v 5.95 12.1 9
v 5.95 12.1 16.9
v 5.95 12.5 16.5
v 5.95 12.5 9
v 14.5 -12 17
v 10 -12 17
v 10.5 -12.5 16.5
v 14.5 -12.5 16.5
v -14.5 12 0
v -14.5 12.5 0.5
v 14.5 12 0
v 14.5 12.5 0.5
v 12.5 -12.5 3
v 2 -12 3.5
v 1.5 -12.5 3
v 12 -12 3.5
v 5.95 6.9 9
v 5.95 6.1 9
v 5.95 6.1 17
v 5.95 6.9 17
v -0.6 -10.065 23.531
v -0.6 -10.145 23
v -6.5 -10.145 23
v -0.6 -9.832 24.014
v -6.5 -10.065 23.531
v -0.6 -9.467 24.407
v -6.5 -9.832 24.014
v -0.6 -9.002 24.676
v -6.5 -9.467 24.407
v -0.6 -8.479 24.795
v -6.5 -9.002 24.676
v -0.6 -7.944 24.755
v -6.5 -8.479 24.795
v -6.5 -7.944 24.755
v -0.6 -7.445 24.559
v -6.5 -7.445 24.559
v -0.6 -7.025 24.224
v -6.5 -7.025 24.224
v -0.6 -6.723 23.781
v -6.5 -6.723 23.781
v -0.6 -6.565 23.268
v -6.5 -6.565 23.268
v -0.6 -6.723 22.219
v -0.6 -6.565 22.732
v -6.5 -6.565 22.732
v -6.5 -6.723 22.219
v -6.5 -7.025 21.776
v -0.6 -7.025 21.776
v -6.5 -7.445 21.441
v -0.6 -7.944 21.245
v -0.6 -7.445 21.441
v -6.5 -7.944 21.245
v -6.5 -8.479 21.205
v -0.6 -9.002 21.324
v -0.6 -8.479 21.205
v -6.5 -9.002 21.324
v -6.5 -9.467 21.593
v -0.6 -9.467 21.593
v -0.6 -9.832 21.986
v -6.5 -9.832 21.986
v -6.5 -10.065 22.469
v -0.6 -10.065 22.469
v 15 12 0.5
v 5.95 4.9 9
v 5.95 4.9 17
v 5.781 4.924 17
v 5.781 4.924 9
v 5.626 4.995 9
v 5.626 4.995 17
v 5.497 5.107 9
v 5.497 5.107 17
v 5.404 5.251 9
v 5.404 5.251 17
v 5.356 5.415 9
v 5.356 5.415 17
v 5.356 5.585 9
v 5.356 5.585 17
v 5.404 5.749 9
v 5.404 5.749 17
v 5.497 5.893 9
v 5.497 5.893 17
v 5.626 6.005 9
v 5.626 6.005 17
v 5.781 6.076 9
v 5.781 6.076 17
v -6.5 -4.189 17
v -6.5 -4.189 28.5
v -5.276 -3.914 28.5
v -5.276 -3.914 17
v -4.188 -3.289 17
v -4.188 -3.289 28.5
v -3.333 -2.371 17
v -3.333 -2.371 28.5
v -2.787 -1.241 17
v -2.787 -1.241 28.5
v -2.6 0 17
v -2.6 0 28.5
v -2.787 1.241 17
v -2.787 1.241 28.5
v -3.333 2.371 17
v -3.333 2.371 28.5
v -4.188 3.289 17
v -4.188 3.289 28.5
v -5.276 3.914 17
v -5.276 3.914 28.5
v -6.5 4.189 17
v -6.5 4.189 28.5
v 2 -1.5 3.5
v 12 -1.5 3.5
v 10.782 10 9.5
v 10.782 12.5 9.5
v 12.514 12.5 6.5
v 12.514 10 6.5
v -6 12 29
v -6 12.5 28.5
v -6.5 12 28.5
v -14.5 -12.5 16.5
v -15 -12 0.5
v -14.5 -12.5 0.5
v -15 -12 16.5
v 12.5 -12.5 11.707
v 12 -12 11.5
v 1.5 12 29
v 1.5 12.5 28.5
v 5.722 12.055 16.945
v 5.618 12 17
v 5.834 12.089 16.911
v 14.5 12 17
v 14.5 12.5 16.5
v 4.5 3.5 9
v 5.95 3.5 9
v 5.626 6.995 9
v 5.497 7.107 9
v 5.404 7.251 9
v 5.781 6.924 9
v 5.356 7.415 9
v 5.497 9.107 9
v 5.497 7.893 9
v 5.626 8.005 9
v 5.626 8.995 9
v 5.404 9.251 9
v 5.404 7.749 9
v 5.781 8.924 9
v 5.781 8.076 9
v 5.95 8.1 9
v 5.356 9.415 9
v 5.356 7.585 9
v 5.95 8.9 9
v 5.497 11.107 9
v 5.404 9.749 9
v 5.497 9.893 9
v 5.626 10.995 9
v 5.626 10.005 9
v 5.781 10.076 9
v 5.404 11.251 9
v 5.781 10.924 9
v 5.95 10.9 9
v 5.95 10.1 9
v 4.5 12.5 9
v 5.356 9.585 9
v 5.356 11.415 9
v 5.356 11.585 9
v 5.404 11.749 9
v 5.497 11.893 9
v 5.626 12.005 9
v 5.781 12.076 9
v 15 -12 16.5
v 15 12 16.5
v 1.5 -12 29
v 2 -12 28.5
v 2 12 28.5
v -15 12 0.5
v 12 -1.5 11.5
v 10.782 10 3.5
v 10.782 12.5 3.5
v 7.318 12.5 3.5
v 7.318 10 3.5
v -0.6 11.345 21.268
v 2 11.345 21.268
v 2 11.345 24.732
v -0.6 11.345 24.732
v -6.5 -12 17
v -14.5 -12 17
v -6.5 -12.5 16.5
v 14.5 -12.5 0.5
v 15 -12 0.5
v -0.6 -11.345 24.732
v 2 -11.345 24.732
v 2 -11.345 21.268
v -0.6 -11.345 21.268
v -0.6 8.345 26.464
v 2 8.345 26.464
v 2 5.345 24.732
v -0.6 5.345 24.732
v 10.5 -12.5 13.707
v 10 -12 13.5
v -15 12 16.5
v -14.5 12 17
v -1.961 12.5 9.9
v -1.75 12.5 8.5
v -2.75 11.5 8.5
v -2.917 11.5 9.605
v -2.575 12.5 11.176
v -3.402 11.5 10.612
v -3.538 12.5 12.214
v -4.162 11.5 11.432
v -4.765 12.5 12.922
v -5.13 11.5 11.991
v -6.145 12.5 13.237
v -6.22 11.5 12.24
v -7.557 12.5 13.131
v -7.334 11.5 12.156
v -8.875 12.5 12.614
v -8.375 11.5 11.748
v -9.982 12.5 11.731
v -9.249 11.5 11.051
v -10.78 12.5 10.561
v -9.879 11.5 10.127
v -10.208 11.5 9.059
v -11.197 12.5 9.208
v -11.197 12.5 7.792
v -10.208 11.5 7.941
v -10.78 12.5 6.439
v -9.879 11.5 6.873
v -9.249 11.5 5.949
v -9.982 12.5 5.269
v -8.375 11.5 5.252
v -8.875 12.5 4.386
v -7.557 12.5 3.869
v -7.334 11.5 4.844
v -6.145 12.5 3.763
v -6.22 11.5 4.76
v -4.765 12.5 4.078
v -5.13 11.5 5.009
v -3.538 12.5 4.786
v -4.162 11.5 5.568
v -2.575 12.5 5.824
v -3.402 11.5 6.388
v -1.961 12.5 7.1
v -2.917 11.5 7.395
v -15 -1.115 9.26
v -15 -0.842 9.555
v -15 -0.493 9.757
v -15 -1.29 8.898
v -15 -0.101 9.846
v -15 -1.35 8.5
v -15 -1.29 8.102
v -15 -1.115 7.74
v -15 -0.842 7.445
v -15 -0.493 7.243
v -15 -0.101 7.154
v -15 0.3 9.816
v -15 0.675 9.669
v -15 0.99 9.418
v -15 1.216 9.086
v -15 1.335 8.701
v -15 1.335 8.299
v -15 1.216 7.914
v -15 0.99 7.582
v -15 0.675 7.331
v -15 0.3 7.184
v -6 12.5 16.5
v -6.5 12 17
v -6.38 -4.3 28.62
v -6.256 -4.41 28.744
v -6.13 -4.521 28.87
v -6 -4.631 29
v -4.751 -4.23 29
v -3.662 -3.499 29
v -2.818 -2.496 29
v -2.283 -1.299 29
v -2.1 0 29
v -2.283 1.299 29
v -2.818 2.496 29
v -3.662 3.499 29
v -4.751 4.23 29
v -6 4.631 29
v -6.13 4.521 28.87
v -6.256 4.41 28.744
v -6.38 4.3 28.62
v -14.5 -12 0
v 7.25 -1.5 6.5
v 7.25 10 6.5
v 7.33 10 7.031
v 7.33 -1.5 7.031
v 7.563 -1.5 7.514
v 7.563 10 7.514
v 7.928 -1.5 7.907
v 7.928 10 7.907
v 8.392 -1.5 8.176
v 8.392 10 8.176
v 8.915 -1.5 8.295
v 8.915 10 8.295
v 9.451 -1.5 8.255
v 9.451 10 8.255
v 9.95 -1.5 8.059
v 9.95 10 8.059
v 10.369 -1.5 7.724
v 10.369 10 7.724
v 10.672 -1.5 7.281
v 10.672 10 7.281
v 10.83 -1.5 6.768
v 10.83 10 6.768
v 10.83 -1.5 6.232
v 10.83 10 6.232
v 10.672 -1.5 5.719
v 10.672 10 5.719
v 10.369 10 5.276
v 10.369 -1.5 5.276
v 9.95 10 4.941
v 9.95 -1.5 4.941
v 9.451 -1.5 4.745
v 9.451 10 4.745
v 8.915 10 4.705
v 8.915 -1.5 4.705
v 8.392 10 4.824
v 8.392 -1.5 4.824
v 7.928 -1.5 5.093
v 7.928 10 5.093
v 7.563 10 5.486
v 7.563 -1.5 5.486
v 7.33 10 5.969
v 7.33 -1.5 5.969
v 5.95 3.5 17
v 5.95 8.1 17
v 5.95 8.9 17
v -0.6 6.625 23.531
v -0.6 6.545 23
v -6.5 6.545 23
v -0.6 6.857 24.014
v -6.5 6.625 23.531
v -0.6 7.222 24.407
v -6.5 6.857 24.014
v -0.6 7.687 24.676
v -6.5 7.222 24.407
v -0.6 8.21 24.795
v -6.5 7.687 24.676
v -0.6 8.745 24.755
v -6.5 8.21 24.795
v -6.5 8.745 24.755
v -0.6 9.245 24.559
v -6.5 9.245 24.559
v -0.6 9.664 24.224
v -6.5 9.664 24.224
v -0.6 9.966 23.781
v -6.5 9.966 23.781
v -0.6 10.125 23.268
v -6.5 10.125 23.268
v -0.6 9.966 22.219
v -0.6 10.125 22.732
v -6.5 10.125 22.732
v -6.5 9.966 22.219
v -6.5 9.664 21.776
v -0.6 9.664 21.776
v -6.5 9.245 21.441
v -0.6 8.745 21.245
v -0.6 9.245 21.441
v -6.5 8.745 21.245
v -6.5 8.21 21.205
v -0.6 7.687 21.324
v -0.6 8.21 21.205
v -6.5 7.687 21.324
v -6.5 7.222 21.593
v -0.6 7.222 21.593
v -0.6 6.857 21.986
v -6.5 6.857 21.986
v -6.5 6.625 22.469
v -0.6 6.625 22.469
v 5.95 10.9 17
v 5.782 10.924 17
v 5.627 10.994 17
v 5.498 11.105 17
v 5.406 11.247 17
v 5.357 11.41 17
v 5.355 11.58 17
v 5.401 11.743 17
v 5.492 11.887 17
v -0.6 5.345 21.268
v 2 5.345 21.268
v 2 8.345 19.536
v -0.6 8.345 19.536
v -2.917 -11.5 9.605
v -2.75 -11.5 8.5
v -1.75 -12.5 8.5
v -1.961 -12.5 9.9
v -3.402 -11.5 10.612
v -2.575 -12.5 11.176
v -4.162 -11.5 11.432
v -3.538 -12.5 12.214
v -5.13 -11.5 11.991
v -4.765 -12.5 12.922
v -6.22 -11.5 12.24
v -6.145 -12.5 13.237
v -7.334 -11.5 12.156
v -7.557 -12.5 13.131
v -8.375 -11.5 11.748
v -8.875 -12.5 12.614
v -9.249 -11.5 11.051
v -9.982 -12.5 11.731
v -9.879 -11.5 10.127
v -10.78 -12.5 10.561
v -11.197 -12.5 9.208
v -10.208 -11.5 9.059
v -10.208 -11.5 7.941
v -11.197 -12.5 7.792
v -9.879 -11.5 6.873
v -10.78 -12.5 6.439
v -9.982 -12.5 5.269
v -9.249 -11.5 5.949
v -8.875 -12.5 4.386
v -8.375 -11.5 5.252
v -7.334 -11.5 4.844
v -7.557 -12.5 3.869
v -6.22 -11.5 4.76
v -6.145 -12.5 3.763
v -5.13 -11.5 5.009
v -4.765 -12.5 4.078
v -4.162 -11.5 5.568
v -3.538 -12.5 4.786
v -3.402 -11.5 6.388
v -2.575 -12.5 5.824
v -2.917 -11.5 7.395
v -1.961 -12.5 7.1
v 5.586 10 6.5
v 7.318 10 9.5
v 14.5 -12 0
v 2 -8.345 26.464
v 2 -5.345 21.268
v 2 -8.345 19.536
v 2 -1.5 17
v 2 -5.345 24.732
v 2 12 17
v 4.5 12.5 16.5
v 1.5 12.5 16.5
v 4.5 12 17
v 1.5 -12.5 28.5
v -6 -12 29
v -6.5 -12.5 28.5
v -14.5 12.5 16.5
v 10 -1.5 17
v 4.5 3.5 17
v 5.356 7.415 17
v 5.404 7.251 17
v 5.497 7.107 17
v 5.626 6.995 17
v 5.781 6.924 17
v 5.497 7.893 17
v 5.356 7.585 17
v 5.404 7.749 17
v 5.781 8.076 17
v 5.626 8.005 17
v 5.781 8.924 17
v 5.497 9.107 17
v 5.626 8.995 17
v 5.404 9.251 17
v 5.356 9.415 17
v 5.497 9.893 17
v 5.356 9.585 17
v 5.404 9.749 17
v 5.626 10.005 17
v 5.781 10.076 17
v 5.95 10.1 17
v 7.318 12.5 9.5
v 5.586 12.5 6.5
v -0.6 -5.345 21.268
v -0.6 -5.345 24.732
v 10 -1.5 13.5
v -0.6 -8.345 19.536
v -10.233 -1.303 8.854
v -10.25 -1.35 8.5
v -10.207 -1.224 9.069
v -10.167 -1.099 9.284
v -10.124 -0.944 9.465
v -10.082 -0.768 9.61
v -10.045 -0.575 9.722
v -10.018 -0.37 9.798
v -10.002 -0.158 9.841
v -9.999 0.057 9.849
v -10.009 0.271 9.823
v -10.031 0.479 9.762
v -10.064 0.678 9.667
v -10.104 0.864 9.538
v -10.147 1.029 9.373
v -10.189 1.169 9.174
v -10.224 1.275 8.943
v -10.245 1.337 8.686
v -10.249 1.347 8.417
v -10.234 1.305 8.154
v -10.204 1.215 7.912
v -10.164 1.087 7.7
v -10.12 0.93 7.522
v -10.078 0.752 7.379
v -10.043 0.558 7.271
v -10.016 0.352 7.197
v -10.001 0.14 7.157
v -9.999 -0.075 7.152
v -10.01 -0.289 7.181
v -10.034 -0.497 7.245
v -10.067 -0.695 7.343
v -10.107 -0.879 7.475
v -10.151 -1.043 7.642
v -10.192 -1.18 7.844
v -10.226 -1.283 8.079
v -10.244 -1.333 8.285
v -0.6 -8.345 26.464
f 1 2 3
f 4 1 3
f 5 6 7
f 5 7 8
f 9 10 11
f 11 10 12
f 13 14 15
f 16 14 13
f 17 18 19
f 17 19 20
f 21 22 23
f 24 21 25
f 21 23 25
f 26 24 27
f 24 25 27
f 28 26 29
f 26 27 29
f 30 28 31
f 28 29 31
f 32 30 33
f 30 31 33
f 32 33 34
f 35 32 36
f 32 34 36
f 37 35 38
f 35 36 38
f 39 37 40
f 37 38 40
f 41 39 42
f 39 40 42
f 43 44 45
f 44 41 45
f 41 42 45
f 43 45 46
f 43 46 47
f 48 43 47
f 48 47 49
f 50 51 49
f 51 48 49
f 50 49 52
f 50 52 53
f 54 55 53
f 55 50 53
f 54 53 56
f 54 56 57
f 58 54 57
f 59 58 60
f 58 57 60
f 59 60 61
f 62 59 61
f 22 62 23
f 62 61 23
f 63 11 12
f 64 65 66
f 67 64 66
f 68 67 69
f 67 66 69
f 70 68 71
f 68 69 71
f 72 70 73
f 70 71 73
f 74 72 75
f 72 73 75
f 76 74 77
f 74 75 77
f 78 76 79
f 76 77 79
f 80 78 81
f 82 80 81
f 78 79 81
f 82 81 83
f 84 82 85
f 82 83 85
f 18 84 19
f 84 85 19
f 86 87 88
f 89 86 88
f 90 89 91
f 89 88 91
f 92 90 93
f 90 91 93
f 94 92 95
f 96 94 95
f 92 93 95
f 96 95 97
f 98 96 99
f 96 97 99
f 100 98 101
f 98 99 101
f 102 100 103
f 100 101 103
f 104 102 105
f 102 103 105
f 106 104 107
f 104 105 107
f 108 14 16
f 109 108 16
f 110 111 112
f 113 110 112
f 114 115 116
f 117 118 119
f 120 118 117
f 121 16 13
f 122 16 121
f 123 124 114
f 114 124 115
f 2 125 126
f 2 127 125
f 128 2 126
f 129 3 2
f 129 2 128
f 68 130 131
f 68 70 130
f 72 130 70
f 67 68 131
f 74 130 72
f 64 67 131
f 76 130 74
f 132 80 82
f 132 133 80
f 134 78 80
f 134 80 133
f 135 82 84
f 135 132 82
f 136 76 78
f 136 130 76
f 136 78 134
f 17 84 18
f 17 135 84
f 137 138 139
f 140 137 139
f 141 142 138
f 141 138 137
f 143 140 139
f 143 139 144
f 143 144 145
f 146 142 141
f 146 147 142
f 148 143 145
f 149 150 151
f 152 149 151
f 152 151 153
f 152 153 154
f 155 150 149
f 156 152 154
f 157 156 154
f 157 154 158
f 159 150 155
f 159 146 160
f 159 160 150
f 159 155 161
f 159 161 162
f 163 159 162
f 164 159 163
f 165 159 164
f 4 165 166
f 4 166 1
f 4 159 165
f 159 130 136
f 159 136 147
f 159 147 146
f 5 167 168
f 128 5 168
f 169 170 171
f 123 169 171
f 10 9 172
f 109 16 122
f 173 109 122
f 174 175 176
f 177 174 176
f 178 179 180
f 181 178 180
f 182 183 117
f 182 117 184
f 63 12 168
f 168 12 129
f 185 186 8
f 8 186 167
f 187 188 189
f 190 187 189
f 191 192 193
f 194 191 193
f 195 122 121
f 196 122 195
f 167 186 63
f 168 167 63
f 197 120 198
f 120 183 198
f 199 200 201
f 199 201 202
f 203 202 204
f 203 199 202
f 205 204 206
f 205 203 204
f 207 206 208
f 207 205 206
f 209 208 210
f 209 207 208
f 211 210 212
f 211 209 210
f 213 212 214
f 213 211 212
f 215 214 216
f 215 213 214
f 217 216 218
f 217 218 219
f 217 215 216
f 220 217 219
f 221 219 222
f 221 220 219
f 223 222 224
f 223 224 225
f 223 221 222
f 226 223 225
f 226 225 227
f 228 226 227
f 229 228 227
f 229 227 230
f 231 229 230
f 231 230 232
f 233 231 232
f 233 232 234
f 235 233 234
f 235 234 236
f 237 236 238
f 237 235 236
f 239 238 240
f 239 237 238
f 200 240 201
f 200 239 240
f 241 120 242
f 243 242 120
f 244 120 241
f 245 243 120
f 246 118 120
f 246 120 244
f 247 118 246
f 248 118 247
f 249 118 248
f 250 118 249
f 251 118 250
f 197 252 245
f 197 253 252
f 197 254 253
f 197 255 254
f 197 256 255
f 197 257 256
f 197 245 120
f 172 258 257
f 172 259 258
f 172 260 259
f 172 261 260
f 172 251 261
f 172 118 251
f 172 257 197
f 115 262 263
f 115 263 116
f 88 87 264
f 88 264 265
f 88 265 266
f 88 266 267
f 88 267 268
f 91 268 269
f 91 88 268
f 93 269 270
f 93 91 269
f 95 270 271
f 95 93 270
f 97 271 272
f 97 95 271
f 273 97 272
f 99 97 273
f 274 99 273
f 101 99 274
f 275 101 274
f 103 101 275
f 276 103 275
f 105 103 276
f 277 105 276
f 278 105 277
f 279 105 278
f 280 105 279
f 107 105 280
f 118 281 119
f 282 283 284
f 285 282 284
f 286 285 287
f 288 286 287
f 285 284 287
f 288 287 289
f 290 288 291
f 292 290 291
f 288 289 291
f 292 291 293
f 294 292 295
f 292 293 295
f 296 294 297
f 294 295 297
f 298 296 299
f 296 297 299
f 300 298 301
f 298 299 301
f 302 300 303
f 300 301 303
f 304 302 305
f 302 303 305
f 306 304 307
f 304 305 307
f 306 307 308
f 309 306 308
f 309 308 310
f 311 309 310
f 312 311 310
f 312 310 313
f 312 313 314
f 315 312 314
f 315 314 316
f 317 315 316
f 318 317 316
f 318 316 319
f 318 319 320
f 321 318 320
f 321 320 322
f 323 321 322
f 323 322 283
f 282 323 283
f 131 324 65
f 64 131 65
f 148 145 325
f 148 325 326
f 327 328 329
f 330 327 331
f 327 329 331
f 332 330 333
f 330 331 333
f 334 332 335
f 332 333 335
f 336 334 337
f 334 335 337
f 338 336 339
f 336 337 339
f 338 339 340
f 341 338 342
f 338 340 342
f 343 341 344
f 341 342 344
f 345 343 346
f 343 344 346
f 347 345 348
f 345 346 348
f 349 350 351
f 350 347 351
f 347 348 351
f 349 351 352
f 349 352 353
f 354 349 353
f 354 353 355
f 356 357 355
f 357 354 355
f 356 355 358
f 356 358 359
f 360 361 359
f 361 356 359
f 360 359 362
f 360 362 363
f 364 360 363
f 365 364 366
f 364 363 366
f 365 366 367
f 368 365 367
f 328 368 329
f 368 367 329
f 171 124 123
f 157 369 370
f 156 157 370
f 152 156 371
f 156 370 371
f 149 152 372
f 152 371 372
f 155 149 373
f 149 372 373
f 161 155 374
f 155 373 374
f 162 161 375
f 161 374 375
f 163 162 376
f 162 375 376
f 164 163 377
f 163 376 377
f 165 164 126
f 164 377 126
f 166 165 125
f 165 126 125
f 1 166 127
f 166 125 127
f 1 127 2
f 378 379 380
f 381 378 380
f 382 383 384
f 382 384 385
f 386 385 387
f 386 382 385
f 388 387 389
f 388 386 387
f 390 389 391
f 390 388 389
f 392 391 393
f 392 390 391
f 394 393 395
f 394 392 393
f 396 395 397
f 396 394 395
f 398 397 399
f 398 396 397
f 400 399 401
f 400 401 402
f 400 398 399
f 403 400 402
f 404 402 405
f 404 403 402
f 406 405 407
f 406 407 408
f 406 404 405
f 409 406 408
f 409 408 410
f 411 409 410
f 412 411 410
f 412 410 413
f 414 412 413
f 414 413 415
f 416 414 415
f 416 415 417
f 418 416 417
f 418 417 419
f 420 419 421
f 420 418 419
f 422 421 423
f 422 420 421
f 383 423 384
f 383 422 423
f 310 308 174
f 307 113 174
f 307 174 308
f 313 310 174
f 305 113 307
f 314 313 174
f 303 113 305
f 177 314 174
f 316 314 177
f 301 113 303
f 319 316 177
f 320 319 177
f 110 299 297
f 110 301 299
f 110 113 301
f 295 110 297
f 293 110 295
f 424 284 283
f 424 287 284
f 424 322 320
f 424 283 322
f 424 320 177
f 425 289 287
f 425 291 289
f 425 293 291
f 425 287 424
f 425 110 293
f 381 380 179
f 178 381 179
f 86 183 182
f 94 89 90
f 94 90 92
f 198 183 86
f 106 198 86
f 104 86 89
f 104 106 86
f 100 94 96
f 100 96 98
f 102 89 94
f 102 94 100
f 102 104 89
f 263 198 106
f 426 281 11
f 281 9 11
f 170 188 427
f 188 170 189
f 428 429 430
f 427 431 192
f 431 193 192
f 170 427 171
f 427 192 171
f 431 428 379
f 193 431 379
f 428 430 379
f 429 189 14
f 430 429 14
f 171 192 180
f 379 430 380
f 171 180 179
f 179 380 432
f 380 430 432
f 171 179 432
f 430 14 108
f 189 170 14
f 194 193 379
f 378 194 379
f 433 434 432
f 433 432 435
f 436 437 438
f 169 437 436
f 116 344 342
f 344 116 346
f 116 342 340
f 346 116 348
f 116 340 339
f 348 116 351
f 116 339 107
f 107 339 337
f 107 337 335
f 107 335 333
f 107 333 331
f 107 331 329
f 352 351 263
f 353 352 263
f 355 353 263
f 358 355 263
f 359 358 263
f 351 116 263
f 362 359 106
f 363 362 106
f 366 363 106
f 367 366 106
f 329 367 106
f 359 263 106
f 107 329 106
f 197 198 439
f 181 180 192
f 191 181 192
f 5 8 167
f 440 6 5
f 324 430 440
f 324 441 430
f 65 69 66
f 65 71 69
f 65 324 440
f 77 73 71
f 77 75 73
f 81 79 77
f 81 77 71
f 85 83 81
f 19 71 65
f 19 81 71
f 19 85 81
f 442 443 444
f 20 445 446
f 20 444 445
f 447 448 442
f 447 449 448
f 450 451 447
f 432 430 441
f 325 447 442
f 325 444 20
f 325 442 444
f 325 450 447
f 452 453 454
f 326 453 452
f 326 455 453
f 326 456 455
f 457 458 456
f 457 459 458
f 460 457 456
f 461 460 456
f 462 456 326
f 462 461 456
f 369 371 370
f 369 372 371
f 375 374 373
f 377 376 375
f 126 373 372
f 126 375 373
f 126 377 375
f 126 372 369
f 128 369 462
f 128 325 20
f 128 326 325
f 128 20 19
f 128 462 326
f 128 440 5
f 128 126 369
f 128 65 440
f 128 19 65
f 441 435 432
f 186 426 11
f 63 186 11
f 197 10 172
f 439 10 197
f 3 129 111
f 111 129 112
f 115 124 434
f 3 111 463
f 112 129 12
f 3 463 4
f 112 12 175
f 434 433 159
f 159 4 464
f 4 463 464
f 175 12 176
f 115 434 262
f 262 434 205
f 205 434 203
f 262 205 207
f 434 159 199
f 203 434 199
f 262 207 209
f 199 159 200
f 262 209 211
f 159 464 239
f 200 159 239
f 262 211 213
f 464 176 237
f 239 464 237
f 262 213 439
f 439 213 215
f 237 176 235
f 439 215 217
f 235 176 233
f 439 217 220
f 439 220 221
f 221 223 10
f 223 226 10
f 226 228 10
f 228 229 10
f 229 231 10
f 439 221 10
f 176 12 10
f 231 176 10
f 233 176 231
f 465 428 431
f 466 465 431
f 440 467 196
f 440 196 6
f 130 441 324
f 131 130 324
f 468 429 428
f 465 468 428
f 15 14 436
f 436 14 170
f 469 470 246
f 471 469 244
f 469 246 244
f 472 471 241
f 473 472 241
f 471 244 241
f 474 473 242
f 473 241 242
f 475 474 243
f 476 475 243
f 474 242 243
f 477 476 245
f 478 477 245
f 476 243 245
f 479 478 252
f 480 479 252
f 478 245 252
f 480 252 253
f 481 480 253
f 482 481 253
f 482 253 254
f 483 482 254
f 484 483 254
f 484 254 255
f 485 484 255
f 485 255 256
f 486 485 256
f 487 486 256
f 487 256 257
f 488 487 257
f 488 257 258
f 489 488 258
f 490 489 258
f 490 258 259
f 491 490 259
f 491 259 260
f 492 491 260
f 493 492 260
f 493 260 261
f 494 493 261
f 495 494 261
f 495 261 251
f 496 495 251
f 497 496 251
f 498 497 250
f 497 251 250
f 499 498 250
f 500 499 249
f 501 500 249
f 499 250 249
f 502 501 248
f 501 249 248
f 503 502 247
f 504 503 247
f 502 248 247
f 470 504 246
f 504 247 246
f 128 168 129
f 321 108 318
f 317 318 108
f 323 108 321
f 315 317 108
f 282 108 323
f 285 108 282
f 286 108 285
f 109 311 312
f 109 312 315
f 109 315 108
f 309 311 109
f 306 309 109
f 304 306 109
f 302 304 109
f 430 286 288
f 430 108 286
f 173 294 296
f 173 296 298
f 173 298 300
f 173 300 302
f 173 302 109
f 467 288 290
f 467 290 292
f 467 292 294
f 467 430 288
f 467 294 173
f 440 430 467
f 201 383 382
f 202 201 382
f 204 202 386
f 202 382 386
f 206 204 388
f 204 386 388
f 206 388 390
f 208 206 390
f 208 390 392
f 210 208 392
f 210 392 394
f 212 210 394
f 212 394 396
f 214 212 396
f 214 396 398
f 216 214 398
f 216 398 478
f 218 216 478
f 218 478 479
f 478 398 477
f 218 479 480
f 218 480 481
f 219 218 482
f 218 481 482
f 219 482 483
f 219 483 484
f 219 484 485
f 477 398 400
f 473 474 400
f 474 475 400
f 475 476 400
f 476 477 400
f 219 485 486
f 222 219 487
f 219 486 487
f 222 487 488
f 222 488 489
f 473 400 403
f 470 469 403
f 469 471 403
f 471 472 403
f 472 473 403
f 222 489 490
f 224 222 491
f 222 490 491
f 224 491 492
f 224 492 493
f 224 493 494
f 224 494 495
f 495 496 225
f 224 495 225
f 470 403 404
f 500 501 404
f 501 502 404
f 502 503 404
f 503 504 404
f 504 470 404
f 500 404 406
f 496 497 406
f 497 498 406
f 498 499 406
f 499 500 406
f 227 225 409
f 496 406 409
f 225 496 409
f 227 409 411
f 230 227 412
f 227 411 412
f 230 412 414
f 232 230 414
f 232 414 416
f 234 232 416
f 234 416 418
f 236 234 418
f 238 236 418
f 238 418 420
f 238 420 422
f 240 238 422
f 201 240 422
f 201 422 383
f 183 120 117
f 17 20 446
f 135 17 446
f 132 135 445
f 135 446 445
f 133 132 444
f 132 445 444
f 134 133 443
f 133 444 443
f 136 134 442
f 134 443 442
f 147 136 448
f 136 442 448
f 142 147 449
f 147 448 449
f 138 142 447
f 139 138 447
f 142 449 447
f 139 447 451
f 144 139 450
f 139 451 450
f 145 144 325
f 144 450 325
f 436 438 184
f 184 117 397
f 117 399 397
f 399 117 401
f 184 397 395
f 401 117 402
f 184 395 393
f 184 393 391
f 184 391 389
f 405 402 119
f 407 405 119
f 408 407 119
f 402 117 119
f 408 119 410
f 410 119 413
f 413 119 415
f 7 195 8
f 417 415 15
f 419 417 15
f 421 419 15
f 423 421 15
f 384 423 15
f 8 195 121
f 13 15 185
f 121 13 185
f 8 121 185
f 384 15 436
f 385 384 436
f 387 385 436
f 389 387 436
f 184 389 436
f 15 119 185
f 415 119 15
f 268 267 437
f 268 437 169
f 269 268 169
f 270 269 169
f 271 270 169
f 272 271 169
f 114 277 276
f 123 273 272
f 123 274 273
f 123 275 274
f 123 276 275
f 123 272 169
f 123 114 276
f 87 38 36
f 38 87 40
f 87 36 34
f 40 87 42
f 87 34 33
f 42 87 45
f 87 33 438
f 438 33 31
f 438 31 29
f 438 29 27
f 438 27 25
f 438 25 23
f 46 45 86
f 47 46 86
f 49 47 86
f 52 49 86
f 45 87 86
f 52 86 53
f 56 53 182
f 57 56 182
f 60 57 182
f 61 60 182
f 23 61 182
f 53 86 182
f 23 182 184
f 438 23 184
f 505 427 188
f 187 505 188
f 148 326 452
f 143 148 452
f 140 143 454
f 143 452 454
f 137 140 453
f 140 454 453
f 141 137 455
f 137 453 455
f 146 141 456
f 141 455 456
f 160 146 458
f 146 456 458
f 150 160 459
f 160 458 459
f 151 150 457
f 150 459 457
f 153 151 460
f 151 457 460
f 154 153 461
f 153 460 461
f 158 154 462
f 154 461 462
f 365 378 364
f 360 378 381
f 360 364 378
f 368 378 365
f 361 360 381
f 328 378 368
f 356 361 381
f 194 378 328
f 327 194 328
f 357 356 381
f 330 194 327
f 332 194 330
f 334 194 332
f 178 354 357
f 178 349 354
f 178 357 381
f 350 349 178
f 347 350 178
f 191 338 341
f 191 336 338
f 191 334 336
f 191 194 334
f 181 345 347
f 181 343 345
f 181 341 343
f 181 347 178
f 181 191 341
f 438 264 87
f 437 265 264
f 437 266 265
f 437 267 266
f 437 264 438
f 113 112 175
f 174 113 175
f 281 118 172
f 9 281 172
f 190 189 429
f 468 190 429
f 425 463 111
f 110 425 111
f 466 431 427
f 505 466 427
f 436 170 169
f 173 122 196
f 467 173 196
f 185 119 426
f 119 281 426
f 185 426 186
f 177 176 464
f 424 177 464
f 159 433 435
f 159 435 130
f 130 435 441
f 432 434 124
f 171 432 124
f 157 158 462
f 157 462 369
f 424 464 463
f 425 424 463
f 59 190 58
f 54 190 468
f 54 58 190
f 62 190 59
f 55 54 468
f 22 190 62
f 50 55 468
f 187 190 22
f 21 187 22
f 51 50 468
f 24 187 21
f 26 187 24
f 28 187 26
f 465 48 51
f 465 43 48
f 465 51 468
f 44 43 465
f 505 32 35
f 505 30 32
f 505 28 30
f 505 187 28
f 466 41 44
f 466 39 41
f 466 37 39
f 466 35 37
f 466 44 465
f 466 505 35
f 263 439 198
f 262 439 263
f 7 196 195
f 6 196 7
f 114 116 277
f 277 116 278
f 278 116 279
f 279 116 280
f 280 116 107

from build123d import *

# Parameters (mm, degrees)
F0_W      = 30
F0_H      = 25
F1_DEPTH  = 17
F3_DEPTH  = 11
F4_R      = 3.75
F5_DEPTH  = 25
F7_DEPTH  = 12
F9_DEPTH  = 12
F10_R     = 1.8
F11_DEPTH = 8.5
F12_R     = 1.8
F13_DEPTH = 2.6
F15_DEPTH = 8
F16_R     = 1.8
F17_DEPTH = 14
F18_R     = 1.8
F19_DEPTH = 2.5
F21_SIZE  = 0.5
F22_SIZE2 = 1
F22_SIZE  = 1
F23_R     = 1.35
F24_DEPTH = 5.0024289631


with BuildPart() as f1:
    # F0 (on Top) → F1 (new body)
    with BuildSketch(Plane.XY):
        Rectangle(F0_W, F0_H)
    extrude(amount=F1_DEPTH)

    # F2 (on face) → F3 (cut)
    with BuildSketch(Plane.XZ.offset(12.5)):
        Polygon((10, 17), (2, 17), (2, 3.5), (12, 3.5), (12, 11.5), (10, 13.5), align=None)
    extrude(amount=-F3_DEPTH, mode=Mode.SUBTRACT)

    # F4 (on face) → F5 (cut, through all)
    with BuildSketch(Plane.XZ.offset(12.5)):
        with Locations((-6.5, 8.5)):
            Circle(F4_R)
    extrude(amount=-F5_DEPTH, mode=Mode.SUBTRACT)

    # F6 (on face) → F7 (join)
    with BuildSketch(Plane.XY.offset(17)):
        Polygon((-6.5, -12.5), (2, -12.5), (2, -1.5), (2, 12.5), (-6.5, 12.5), align=None)
    extrude(amount=F7_DEPTH)

    # F8 (on face) → F9 (cut)
    with BuildSketch(Plane.XY.offset(29)):
        with BuildLine():
            Line((-6.5, 4.1892720131), (-6.5, -4.1892720131))
            ThreePointArc((-6.5, -4.1892720131), (-2.6, 0), (-6.5, 4.1892720131))
        make_face()
    extrude(amount=-F9_DEPTH, mode=Mode.SUBTRACT)

    # F10 (on face) → F11 (cut, through all)
    with BuildSketch(Plane(origin=(-6.5, 0, 0), x_dir=(0, -1, 0), z_dir=(-1, 0, 0))):
        with Locations((-8.3446360066, 23)):
            Circle(F10_R)
        with Locations((8.3446360066, 23)):
            Circle(F10_R)
    extrude(amount=-F11_DEPTH, mode=Mode.SUBTRACT)

    # F12 (on face) → F13 (cut)
    with BuildSketch(Plane.YZ.offset(2)):
        Polygon((11.3446360067, 21.2679491924), (11.3446360067, 24.7320508076), (8.3446360067, 26.4641016151), (5.3446360067, 24.7320508076), (5.3446360067, 21.2679491924), (8.3446360067, 19.5358983849), align=None)
        with Locations((8.3446360066, 23)):
            Circle(F12_R, mode=Mode.SUBTRACT)
        Polygon((-5.3446360065, 21.2679491924), (-5.3446360065, 24.7320508076), (-8.3446360065, 26.4641016151), (-11.3446360065, 24.7320508076), (-11.3446360065, 21.2679491924), (-8.3446360065, 19.5358983849), align=None)
        with Locations((-8.3446360066, 23)):
            Circle(F12_R, mode=Mode.SUBTRACT)
    extrude(amount=-F13_DEPTH, mode=Mode.SUBTRACT)

    # F14 (on face) → F15 (cut)
    with BuildSketch(Plane.XY.offset(17)):
        with BuildLine():
            Line((5.95, 12.5), (4.5, 12.5))
            Line((4.5, 12.5), (4.5, 3.5))
            Line((4.5, 3.5), (5.95, 3.5))
            Line((5.95, 3.5), (5.95, 4.9))
            ThreePointArc((5.95, 4.9), (5.35, 5.5), (5.95, 6.1))
            Line((5.95, 6.1), (5.95, 6.9))
            ThreePointArc((5.95, 6.9), (5.35, 7.5), (5.95, 8.1))
            Line((5.95, 8.1), (5.95, 8.9))
            ThreePointArc((5.95, 8.9), (5.35, 9.5), (5.95, 10.1))
            Line((5.95, 10.1), (5.95, 10.9))
            ThreePointArc((5.95, 10.9), (5.35, 11.5), (5.95, 12.1))
            Line((5.95, 12.1), (5.95, 12.5))
        make_face()
    extrude(amount=-F15_DEPTH, mode=Mode.SUBTRACT)

    # F16 (on face) → F17 (cut, through all)
    with BuildSketch(Plane(origin=(0, 12.5, 0), x_dir=(-1, 0, 0), z_dir=(0, 1, 0))):
        with Locations((-9.05, 6.5)):
            Circle(F16_R)
    extrude(amount=-F17_DEPTH, mode=Mode.SUBTRACT)

    # F18 (on face) → F19 (cut)
    with BuildSketch(Plane(origin=(0, 12.5, 0), x_dir=(-1, 0, 0), z_dir=(0, 1, 0))):
        Polygon((-7.3179491924, 9.5), (-10.7820508076, 9.5), (-12.5141016151, 6.5), (-10.7820508076, 3.5), (-7.3179491924, 3.5), (-5.5858983849, 6.5), align=None)
        with Locations((-9.05, 6.5)):
            Circle(F18_R, mode=Mode.SUBTRACT)
    extrude(amount=-F19_DEPTH, mode=Mode.SUBTRACT)

    # F21
    f21_edges = [f1.edges().sort_by_distance(p)[0] for p in [
        (0, -12.5, 0),
        (-15, 0, 0),
        (0, 12.5, 0),
        (15, 0, 0),
        (-15, 0, 17),
        (-10.75, 12.5, 17),
        (-15, 12.5, 8.5),
        (-15, -12.5, 8.5),
        (2, -12.5, 16.25),
        (7, -12.5, 3.5),
        (12, -12.5, 7.5),
        (11, -12.5, 12.5),
        (10, -12.5, 15.25),
        (15, -12.5, 8.5),
        (12.5, -12.5, 17),
        (15, 0, 17),
        (15, 12.5, 8.5),
        (10.475, 12.5, 17),
        (3.25, 12.5, 17),
        (2, 12.5, 23),
        (-6.5, 12.5, 23),
        (-2.25, 12.5, 29),
        (2, 0, 29),
        (-2.25, -12.5, 29),
        (-10.75, -12.5, 17),
        (-6.5, -8.344636, 29),
        (-2.6, 0, 29),
        (-6.5, 8.344636, 29),
    ]]
    chamfer(f21_edges, length=F21_SIZE)

    # F22
    f22_edges = [f1.edges().sort_by_distance(p)[0] for p in [
        (-2.75, 0, 8.5),
        (-10.25, -12.5, 8.5),
        (-10.25, 12.5, 8.5),
    ]]
    chamfer(f22_edges, length=F22_SIZE, length2=F22_SIZE2)

    # F23 (on face) → F24 (cut, through all)
    with BuildSketch(Plane(origin=(-15, 0, 0), x_dir=(0, -1, 0), z_dir=(-1, 0, 0))):
        with Locations((0, 8.5)):
            Circle(F23_R)
    extrude(amount=-F24_DEPTH, mode=Mode.SUBTRACT)


solid = f1.part
